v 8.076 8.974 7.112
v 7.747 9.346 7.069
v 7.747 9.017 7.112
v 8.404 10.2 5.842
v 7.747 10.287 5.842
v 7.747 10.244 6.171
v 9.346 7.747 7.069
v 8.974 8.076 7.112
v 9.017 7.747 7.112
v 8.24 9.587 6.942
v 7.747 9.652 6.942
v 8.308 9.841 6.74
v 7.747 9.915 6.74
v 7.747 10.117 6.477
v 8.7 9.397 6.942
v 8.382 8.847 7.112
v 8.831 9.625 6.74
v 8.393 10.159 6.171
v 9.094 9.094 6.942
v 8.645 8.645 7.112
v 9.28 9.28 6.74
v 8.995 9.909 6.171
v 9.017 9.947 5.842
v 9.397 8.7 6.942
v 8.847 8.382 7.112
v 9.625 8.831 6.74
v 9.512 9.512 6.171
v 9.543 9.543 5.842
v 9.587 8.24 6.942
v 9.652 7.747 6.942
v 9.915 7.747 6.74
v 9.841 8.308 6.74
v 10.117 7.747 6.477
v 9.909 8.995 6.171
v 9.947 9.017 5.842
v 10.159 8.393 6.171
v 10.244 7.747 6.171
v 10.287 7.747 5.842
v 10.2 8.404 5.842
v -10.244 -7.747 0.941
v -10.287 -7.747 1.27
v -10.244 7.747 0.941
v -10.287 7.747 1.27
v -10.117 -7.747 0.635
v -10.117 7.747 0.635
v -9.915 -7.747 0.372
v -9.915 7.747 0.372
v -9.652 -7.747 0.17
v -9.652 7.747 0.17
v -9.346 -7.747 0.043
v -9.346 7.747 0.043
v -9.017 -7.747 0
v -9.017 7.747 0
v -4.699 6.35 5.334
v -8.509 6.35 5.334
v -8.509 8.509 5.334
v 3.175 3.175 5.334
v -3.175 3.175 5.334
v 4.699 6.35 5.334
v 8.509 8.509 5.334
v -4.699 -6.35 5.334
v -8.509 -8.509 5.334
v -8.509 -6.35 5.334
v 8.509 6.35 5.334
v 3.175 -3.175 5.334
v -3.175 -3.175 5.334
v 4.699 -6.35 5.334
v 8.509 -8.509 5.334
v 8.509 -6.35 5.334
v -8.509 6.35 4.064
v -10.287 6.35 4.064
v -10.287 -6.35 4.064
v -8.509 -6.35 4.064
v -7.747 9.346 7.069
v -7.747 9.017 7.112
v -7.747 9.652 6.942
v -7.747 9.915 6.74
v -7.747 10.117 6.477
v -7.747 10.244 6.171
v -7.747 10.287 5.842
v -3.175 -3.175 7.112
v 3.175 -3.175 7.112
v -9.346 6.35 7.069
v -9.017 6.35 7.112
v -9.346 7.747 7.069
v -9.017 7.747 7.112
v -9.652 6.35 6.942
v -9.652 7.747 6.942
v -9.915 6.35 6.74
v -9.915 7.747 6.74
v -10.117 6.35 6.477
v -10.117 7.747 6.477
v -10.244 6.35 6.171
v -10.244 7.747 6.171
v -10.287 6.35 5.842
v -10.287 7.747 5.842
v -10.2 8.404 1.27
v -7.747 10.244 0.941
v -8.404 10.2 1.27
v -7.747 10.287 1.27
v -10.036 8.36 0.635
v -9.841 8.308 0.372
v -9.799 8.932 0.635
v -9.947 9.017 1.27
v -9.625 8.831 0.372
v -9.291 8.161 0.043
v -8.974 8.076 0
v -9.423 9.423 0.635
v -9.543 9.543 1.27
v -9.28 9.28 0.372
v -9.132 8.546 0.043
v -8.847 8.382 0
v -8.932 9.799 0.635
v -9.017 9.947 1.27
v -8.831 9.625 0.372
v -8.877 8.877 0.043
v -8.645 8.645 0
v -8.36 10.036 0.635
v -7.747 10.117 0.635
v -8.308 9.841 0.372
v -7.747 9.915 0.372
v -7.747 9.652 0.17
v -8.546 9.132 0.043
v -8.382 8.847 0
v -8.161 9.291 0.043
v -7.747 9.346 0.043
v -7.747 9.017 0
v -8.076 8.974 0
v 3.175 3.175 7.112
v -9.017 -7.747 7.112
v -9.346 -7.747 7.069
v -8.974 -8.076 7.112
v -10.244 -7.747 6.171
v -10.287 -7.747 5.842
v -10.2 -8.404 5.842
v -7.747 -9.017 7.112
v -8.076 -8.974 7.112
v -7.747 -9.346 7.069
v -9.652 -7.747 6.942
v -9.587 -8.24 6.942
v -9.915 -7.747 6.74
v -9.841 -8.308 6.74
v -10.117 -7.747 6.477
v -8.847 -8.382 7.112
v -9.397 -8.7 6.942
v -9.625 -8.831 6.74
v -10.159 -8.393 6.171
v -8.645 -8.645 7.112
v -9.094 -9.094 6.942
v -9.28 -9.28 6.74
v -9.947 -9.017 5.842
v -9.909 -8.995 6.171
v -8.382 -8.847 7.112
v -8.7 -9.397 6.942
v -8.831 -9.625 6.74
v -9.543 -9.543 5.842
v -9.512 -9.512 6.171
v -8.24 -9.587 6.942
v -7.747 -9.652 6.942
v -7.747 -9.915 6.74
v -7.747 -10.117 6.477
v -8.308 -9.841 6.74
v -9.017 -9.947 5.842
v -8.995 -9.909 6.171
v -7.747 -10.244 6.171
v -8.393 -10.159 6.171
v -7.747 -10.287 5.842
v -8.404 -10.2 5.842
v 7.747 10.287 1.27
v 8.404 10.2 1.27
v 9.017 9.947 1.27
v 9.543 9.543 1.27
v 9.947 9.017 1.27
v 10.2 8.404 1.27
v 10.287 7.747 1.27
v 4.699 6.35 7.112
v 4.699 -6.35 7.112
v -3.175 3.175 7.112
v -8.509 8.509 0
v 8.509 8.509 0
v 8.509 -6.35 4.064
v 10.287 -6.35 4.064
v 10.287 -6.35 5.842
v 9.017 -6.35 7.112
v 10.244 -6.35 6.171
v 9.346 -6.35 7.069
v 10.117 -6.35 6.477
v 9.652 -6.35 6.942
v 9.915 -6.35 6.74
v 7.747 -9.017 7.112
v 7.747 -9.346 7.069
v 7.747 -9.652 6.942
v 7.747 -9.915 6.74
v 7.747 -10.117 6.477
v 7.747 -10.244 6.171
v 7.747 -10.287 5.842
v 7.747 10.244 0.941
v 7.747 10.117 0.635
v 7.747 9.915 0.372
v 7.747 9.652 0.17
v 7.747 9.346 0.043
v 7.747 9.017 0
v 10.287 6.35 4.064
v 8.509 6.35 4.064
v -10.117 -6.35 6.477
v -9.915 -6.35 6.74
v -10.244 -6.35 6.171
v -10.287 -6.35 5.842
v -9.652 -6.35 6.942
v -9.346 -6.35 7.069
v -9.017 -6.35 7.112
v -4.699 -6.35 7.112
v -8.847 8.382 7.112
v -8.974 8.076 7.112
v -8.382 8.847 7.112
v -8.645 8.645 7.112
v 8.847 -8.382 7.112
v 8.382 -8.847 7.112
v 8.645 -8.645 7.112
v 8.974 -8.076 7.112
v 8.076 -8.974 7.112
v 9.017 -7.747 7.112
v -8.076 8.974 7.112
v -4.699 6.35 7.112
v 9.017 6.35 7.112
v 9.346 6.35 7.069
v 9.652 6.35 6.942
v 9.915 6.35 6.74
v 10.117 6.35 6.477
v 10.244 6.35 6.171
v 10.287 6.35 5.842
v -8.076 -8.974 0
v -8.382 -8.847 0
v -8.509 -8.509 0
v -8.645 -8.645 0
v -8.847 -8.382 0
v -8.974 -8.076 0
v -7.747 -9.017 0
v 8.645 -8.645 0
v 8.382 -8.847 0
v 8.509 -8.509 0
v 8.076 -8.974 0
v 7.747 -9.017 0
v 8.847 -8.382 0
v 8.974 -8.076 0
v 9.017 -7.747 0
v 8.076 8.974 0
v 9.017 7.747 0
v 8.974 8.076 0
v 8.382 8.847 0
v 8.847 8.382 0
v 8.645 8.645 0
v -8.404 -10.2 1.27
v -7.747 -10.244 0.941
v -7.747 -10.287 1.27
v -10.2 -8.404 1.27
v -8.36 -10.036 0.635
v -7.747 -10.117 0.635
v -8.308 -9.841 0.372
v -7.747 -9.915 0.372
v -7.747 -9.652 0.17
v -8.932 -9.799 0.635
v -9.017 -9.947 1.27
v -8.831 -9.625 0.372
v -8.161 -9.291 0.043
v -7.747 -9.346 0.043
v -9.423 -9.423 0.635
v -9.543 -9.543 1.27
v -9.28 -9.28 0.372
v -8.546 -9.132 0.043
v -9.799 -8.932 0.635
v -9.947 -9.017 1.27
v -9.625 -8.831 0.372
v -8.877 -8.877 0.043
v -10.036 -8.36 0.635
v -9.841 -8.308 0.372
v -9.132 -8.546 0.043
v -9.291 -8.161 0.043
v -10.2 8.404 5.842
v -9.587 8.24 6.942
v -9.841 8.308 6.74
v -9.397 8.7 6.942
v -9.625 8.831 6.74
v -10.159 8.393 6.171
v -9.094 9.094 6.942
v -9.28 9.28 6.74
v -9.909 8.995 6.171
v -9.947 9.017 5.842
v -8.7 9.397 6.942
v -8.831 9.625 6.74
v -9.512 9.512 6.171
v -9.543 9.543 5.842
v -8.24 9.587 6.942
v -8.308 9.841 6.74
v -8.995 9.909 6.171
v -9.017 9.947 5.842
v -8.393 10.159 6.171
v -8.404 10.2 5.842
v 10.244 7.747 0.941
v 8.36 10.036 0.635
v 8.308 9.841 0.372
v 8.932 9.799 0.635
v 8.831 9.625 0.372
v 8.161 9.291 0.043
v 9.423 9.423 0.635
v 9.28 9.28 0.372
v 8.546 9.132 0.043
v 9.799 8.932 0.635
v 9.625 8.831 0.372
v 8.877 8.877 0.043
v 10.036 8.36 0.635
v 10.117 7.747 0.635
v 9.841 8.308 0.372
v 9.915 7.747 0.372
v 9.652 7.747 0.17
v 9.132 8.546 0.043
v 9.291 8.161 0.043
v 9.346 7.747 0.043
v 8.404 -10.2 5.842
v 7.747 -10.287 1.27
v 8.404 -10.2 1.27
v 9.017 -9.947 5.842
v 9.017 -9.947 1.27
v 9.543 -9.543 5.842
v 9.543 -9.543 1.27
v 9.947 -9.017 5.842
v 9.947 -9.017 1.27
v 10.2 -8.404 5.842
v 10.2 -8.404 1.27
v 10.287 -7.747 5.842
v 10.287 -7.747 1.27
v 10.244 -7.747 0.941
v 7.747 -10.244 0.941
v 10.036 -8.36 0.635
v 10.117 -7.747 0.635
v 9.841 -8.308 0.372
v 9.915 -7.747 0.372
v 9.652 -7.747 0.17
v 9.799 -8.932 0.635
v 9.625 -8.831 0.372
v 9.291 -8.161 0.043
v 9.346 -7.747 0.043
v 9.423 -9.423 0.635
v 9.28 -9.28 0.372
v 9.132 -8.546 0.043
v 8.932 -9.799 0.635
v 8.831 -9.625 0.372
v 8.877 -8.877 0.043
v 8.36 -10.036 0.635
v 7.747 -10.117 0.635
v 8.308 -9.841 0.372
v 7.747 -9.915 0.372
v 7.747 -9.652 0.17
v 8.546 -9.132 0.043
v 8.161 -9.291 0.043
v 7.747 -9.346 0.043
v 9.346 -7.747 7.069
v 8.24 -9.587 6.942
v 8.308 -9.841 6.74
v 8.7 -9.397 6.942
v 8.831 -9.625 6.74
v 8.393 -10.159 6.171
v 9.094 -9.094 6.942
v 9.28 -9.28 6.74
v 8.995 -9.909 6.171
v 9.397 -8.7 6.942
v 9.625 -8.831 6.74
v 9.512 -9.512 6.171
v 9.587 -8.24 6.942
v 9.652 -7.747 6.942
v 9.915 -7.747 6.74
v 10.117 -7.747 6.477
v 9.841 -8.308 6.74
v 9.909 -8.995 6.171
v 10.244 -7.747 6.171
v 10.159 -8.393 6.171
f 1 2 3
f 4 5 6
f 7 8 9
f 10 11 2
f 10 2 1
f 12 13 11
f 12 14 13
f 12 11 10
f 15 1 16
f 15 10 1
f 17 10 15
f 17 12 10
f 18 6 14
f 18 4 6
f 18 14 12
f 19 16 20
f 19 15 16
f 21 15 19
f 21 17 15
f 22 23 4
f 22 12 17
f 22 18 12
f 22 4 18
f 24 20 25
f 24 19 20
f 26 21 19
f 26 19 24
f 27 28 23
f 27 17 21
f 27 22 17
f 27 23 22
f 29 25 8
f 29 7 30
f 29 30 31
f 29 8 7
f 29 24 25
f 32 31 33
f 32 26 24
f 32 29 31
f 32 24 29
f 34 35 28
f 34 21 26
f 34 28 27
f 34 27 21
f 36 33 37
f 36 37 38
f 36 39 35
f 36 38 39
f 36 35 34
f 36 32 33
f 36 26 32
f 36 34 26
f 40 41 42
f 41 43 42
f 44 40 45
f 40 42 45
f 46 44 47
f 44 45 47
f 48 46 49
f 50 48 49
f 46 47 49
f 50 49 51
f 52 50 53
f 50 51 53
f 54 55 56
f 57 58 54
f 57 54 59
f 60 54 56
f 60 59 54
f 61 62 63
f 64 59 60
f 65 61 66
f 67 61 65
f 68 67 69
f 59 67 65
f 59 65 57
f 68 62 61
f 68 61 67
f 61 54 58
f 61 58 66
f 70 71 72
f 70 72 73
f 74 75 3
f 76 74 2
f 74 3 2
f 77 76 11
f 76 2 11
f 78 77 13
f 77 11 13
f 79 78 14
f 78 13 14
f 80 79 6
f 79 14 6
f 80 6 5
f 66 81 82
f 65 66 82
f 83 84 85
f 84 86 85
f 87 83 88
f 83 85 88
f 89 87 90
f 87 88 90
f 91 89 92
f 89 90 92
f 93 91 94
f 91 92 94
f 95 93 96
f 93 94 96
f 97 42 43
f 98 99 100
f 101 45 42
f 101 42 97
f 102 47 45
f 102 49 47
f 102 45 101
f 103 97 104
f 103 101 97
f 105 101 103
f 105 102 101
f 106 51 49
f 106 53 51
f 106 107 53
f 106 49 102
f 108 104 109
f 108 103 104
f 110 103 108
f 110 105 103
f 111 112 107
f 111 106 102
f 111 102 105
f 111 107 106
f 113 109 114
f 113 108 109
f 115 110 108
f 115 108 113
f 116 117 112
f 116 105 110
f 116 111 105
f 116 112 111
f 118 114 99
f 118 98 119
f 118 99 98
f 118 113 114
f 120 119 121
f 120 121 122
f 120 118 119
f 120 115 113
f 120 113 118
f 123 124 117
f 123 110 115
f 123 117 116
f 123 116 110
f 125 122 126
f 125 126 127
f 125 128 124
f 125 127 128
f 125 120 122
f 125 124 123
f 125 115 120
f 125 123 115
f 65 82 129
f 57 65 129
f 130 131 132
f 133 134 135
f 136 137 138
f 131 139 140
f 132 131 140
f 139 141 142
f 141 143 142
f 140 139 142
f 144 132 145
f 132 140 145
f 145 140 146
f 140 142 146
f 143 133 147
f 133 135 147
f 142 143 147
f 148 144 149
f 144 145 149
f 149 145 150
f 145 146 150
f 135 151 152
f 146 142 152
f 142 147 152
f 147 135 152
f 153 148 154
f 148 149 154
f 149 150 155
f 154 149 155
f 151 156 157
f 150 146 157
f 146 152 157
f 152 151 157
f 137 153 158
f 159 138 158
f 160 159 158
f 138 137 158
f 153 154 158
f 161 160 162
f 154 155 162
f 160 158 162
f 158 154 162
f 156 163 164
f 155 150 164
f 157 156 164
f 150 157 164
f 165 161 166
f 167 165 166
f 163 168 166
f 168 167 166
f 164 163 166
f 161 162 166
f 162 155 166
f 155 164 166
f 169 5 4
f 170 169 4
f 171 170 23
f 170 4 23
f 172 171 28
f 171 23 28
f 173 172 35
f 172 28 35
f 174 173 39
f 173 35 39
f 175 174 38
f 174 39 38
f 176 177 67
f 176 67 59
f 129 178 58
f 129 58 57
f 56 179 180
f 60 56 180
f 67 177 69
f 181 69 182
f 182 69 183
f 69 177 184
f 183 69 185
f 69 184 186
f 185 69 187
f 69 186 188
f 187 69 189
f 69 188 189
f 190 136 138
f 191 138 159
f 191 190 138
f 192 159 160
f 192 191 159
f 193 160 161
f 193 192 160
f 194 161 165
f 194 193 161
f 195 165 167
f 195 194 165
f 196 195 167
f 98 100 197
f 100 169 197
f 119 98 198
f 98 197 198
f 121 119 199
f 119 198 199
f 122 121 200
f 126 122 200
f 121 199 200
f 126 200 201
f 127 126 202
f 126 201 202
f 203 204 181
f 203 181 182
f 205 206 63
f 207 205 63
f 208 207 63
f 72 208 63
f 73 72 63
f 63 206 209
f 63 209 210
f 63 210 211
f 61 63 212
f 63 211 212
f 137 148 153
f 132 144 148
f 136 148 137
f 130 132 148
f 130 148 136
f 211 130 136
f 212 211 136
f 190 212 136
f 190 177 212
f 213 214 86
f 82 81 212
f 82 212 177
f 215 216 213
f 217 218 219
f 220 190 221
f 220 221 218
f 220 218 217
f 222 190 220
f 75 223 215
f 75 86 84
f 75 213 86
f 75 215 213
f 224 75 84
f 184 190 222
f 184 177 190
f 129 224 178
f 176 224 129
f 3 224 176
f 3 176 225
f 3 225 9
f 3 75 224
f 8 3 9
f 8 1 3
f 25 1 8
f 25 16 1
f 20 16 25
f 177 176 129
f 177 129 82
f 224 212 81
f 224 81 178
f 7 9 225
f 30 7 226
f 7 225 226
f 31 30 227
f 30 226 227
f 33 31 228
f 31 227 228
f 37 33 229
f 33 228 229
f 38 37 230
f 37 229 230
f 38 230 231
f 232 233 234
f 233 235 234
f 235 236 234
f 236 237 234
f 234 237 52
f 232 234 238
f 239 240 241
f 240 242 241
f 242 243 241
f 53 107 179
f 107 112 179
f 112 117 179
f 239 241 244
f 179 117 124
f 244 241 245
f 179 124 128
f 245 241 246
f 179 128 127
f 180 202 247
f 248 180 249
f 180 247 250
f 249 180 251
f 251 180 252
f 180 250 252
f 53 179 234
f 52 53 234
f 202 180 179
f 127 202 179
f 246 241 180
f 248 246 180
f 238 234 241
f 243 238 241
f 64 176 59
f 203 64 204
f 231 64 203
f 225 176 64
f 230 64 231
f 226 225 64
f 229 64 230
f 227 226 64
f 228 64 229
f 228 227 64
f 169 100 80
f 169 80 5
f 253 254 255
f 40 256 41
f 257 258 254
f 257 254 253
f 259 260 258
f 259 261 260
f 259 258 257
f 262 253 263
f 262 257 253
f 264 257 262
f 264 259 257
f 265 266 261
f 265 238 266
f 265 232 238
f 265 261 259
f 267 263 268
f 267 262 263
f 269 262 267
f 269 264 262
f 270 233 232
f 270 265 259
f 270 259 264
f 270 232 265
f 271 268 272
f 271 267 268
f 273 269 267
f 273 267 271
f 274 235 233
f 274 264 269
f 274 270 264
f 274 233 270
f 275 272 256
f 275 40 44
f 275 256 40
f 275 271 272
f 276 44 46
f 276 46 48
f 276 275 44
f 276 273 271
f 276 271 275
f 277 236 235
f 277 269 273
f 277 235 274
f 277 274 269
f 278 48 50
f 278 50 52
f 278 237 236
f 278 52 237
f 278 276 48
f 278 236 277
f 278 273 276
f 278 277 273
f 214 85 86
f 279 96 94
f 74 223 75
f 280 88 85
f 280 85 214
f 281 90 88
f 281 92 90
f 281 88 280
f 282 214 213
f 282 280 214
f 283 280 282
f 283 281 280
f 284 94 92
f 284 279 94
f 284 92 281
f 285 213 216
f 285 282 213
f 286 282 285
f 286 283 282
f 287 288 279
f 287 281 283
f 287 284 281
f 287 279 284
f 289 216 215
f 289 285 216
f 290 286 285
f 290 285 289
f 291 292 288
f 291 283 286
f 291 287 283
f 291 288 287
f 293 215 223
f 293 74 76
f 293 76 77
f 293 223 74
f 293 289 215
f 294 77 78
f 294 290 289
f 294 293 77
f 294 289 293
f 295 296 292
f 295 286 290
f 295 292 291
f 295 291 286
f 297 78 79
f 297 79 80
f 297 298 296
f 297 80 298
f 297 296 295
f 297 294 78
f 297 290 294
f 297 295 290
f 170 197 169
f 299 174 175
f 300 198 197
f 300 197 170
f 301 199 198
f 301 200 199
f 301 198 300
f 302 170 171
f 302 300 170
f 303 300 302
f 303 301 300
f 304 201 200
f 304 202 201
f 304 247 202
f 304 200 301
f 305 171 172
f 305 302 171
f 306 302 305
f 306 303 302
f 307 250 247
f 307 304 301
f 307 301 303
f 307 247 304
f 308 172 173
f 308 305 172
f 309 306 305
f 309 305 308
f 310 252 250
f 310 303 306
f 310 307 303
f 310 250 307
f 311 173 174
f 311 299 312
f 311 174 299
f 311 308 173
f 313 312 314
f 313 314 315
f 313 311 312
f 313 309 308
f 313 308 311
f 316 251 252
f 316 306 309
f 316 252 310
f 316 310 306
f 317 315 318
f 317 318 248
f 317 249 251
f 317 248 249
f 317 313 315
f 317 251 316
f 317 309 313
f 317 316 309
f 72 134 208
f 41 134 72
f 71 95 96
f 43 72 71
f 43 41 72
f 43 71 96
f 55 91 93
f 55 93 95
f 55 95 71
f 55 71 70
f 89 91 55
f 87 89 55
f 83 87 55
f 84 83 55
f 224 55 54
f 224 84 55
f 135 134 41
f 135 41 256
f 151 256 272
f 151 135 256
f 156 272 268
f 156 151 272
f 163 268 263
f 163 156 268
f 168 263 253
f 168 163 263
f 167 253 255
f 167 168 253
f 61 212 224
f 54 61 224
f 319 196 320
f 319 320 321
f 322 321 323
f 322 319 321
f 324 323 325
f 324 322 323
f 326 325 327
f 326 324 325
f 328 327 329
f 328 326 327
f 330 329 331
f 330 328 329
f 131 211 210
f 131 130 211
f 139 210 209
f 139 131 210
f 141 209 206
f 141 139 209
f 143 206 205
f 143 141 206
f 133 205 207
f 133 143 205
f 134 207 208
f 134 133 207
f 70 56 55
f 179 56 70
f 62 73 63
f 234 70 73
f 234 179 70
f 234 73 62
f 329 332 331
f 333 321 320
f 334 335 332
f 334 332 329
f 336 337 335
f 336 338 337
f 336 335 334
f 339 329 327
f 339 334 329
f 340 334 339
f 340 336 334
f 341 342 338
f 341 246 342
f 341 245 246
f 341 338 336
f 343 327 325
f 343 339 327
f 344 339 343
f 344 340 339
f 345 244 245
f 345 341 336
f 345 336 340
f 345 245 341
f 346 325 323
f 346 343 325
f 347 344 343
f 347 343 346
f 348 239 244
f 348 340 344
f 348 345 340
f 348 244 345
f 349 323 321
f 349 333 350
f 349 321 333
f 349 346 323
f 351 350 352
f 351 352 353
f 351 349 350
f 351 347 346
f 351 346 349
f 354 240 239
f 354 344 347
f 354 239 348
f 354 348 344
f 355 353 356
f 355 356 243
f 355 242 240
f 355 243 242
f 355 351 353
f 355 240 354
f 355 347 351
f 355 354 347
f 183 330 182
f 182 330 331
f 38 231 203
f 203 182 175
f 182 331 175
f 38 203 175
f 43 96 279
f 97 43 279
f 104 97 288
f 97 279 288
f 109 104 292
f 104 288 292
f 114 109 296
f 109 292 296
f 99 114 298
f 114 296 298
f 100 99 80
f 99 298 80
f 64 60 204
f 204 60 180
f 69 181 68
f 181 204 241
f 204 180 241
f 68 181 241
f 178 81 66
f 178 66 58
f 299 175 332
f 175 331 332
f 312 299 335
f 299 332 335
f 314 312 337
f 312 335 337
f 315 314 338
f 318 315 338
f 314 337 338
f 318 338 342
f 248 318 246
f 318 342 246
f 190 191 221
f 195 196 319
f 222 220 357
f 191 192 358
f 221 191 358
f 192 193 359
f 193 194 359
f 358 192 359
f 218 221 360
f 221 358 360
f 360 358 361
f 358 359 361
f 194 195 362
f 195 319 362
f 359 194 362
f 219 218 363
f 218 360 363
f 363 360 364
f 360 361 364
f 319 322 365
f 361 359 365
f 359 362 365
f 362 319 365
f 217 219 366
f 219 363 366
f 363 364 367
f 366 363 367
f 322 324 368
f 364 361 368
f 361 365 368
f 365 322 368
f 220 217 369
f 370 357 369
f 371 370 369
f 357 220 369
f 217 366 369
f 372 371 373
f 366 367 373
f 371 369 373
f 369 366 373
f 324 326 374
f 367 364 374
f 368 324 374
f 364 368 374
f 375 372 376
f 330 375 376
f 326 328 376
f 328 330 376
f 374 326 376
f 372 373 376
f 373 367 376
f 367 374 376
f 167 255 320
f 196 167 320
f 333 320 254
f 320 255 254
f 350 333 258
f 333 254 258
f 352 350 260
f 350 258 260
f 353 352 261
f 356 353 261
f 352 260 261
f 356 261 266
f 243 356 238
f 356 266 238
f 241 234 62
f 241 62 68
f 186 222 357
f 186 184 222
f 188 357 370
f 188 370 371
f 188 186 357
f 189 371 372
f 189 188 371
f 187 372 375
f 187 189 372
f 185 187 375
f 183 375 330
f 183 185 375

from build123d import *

# Parameters (mm, degrees)
F0_W      = 20.574
F0_H      = 20.574
F1_DEPTH  = 7.112
F2_W      = 17.018
F2_H      = 17.018
F3_DEPTH  = 5.334
F4_R      = 2.54
F5_W      = 5.588
F5_H      = 12.7
F6_DEPTH  = 3.048
F7_W      = 11.176
F7_H      = 12.7
F8_DEPTH  = 3.048
F9_W      = 6.35
F9_H      = 6.35
F10_DEPTH = 1.778
F11_R     = 1.27
F12_R     = 1.27


with BuildPart() as f1:
    # F0 (on Top) → F1 (new body)
    with BuildSketch(Plane.XY):
        Rectangle(F0_W, F0_H)
    extrude(amount=F1_DEPTH)

    # F2 (on face) → F3 (cut)
    with BuildSketch(Plane(origin=(0, 0, 0), x_dir=(1, 0, 0), z_dir=(0, 0, -1))):
        Rectangle(F2_W, F2_H)
    extrude(amount=-F3_DEPTH, mode=Mode.SUBTRACT)

    # F4
    f4_edges = [f1.edges().sort_by_distance(p)[0] for p in [
        (-10.287, -10.287, 3.556),
        (10.287, 10.287, 3.556),
        (10.287, -10.287, 3.556),
        (-10.287, 10.287, 3.556),
    ]]
    fillet(f4_edges, radius=F4_R)

    # F5 (on face) → F6 (cut)
    with BuildSketch(Plane.XY.offset(7.112)):
        with Locations((-7.493, 0)):
            Rectangle(F5_W, F5_H)
    extrude(amount=-F6_DEPTH, mode=Mode.SUBTRACT)

    # F7 (on face) → F8 (cut)
    with BuildSketch(Plane.XY.offset(7.112)):
        with Locations((10.287, 0)):
            Rectangle(F7_W, F7_H)
    extrude(amount=-F8_DEPTH, mode=Mode.SUBTRACT)

    # F9 (on face) → F10 (cut)
    with BuildSketch(Plane.XY.offset(7.112)):
        Rectangle(F9_W, F9_H)
    extrude(amount=-F10_DEPTH, mode=Mode.SUBTRACT)

    # F11
    f11_edges = [f1.edges().sort_by_distance(p)[0] for p in [
        (0, 10.287, 7.112),
        (0, -10.287, 7.112),
    ]]
    fillet(f11_edges, radius=F11_R)

    # F12
    f12_edges = [f1.edges().sort_by_distance(p)[0] for p in [
        (-10.287, 0, 0),
        (0, 10.287, 0),
        (-9.543051, 9.543051, 0),
    ]]
    fillet(f12_edges, radius=F12_R)


solid = f1.part
